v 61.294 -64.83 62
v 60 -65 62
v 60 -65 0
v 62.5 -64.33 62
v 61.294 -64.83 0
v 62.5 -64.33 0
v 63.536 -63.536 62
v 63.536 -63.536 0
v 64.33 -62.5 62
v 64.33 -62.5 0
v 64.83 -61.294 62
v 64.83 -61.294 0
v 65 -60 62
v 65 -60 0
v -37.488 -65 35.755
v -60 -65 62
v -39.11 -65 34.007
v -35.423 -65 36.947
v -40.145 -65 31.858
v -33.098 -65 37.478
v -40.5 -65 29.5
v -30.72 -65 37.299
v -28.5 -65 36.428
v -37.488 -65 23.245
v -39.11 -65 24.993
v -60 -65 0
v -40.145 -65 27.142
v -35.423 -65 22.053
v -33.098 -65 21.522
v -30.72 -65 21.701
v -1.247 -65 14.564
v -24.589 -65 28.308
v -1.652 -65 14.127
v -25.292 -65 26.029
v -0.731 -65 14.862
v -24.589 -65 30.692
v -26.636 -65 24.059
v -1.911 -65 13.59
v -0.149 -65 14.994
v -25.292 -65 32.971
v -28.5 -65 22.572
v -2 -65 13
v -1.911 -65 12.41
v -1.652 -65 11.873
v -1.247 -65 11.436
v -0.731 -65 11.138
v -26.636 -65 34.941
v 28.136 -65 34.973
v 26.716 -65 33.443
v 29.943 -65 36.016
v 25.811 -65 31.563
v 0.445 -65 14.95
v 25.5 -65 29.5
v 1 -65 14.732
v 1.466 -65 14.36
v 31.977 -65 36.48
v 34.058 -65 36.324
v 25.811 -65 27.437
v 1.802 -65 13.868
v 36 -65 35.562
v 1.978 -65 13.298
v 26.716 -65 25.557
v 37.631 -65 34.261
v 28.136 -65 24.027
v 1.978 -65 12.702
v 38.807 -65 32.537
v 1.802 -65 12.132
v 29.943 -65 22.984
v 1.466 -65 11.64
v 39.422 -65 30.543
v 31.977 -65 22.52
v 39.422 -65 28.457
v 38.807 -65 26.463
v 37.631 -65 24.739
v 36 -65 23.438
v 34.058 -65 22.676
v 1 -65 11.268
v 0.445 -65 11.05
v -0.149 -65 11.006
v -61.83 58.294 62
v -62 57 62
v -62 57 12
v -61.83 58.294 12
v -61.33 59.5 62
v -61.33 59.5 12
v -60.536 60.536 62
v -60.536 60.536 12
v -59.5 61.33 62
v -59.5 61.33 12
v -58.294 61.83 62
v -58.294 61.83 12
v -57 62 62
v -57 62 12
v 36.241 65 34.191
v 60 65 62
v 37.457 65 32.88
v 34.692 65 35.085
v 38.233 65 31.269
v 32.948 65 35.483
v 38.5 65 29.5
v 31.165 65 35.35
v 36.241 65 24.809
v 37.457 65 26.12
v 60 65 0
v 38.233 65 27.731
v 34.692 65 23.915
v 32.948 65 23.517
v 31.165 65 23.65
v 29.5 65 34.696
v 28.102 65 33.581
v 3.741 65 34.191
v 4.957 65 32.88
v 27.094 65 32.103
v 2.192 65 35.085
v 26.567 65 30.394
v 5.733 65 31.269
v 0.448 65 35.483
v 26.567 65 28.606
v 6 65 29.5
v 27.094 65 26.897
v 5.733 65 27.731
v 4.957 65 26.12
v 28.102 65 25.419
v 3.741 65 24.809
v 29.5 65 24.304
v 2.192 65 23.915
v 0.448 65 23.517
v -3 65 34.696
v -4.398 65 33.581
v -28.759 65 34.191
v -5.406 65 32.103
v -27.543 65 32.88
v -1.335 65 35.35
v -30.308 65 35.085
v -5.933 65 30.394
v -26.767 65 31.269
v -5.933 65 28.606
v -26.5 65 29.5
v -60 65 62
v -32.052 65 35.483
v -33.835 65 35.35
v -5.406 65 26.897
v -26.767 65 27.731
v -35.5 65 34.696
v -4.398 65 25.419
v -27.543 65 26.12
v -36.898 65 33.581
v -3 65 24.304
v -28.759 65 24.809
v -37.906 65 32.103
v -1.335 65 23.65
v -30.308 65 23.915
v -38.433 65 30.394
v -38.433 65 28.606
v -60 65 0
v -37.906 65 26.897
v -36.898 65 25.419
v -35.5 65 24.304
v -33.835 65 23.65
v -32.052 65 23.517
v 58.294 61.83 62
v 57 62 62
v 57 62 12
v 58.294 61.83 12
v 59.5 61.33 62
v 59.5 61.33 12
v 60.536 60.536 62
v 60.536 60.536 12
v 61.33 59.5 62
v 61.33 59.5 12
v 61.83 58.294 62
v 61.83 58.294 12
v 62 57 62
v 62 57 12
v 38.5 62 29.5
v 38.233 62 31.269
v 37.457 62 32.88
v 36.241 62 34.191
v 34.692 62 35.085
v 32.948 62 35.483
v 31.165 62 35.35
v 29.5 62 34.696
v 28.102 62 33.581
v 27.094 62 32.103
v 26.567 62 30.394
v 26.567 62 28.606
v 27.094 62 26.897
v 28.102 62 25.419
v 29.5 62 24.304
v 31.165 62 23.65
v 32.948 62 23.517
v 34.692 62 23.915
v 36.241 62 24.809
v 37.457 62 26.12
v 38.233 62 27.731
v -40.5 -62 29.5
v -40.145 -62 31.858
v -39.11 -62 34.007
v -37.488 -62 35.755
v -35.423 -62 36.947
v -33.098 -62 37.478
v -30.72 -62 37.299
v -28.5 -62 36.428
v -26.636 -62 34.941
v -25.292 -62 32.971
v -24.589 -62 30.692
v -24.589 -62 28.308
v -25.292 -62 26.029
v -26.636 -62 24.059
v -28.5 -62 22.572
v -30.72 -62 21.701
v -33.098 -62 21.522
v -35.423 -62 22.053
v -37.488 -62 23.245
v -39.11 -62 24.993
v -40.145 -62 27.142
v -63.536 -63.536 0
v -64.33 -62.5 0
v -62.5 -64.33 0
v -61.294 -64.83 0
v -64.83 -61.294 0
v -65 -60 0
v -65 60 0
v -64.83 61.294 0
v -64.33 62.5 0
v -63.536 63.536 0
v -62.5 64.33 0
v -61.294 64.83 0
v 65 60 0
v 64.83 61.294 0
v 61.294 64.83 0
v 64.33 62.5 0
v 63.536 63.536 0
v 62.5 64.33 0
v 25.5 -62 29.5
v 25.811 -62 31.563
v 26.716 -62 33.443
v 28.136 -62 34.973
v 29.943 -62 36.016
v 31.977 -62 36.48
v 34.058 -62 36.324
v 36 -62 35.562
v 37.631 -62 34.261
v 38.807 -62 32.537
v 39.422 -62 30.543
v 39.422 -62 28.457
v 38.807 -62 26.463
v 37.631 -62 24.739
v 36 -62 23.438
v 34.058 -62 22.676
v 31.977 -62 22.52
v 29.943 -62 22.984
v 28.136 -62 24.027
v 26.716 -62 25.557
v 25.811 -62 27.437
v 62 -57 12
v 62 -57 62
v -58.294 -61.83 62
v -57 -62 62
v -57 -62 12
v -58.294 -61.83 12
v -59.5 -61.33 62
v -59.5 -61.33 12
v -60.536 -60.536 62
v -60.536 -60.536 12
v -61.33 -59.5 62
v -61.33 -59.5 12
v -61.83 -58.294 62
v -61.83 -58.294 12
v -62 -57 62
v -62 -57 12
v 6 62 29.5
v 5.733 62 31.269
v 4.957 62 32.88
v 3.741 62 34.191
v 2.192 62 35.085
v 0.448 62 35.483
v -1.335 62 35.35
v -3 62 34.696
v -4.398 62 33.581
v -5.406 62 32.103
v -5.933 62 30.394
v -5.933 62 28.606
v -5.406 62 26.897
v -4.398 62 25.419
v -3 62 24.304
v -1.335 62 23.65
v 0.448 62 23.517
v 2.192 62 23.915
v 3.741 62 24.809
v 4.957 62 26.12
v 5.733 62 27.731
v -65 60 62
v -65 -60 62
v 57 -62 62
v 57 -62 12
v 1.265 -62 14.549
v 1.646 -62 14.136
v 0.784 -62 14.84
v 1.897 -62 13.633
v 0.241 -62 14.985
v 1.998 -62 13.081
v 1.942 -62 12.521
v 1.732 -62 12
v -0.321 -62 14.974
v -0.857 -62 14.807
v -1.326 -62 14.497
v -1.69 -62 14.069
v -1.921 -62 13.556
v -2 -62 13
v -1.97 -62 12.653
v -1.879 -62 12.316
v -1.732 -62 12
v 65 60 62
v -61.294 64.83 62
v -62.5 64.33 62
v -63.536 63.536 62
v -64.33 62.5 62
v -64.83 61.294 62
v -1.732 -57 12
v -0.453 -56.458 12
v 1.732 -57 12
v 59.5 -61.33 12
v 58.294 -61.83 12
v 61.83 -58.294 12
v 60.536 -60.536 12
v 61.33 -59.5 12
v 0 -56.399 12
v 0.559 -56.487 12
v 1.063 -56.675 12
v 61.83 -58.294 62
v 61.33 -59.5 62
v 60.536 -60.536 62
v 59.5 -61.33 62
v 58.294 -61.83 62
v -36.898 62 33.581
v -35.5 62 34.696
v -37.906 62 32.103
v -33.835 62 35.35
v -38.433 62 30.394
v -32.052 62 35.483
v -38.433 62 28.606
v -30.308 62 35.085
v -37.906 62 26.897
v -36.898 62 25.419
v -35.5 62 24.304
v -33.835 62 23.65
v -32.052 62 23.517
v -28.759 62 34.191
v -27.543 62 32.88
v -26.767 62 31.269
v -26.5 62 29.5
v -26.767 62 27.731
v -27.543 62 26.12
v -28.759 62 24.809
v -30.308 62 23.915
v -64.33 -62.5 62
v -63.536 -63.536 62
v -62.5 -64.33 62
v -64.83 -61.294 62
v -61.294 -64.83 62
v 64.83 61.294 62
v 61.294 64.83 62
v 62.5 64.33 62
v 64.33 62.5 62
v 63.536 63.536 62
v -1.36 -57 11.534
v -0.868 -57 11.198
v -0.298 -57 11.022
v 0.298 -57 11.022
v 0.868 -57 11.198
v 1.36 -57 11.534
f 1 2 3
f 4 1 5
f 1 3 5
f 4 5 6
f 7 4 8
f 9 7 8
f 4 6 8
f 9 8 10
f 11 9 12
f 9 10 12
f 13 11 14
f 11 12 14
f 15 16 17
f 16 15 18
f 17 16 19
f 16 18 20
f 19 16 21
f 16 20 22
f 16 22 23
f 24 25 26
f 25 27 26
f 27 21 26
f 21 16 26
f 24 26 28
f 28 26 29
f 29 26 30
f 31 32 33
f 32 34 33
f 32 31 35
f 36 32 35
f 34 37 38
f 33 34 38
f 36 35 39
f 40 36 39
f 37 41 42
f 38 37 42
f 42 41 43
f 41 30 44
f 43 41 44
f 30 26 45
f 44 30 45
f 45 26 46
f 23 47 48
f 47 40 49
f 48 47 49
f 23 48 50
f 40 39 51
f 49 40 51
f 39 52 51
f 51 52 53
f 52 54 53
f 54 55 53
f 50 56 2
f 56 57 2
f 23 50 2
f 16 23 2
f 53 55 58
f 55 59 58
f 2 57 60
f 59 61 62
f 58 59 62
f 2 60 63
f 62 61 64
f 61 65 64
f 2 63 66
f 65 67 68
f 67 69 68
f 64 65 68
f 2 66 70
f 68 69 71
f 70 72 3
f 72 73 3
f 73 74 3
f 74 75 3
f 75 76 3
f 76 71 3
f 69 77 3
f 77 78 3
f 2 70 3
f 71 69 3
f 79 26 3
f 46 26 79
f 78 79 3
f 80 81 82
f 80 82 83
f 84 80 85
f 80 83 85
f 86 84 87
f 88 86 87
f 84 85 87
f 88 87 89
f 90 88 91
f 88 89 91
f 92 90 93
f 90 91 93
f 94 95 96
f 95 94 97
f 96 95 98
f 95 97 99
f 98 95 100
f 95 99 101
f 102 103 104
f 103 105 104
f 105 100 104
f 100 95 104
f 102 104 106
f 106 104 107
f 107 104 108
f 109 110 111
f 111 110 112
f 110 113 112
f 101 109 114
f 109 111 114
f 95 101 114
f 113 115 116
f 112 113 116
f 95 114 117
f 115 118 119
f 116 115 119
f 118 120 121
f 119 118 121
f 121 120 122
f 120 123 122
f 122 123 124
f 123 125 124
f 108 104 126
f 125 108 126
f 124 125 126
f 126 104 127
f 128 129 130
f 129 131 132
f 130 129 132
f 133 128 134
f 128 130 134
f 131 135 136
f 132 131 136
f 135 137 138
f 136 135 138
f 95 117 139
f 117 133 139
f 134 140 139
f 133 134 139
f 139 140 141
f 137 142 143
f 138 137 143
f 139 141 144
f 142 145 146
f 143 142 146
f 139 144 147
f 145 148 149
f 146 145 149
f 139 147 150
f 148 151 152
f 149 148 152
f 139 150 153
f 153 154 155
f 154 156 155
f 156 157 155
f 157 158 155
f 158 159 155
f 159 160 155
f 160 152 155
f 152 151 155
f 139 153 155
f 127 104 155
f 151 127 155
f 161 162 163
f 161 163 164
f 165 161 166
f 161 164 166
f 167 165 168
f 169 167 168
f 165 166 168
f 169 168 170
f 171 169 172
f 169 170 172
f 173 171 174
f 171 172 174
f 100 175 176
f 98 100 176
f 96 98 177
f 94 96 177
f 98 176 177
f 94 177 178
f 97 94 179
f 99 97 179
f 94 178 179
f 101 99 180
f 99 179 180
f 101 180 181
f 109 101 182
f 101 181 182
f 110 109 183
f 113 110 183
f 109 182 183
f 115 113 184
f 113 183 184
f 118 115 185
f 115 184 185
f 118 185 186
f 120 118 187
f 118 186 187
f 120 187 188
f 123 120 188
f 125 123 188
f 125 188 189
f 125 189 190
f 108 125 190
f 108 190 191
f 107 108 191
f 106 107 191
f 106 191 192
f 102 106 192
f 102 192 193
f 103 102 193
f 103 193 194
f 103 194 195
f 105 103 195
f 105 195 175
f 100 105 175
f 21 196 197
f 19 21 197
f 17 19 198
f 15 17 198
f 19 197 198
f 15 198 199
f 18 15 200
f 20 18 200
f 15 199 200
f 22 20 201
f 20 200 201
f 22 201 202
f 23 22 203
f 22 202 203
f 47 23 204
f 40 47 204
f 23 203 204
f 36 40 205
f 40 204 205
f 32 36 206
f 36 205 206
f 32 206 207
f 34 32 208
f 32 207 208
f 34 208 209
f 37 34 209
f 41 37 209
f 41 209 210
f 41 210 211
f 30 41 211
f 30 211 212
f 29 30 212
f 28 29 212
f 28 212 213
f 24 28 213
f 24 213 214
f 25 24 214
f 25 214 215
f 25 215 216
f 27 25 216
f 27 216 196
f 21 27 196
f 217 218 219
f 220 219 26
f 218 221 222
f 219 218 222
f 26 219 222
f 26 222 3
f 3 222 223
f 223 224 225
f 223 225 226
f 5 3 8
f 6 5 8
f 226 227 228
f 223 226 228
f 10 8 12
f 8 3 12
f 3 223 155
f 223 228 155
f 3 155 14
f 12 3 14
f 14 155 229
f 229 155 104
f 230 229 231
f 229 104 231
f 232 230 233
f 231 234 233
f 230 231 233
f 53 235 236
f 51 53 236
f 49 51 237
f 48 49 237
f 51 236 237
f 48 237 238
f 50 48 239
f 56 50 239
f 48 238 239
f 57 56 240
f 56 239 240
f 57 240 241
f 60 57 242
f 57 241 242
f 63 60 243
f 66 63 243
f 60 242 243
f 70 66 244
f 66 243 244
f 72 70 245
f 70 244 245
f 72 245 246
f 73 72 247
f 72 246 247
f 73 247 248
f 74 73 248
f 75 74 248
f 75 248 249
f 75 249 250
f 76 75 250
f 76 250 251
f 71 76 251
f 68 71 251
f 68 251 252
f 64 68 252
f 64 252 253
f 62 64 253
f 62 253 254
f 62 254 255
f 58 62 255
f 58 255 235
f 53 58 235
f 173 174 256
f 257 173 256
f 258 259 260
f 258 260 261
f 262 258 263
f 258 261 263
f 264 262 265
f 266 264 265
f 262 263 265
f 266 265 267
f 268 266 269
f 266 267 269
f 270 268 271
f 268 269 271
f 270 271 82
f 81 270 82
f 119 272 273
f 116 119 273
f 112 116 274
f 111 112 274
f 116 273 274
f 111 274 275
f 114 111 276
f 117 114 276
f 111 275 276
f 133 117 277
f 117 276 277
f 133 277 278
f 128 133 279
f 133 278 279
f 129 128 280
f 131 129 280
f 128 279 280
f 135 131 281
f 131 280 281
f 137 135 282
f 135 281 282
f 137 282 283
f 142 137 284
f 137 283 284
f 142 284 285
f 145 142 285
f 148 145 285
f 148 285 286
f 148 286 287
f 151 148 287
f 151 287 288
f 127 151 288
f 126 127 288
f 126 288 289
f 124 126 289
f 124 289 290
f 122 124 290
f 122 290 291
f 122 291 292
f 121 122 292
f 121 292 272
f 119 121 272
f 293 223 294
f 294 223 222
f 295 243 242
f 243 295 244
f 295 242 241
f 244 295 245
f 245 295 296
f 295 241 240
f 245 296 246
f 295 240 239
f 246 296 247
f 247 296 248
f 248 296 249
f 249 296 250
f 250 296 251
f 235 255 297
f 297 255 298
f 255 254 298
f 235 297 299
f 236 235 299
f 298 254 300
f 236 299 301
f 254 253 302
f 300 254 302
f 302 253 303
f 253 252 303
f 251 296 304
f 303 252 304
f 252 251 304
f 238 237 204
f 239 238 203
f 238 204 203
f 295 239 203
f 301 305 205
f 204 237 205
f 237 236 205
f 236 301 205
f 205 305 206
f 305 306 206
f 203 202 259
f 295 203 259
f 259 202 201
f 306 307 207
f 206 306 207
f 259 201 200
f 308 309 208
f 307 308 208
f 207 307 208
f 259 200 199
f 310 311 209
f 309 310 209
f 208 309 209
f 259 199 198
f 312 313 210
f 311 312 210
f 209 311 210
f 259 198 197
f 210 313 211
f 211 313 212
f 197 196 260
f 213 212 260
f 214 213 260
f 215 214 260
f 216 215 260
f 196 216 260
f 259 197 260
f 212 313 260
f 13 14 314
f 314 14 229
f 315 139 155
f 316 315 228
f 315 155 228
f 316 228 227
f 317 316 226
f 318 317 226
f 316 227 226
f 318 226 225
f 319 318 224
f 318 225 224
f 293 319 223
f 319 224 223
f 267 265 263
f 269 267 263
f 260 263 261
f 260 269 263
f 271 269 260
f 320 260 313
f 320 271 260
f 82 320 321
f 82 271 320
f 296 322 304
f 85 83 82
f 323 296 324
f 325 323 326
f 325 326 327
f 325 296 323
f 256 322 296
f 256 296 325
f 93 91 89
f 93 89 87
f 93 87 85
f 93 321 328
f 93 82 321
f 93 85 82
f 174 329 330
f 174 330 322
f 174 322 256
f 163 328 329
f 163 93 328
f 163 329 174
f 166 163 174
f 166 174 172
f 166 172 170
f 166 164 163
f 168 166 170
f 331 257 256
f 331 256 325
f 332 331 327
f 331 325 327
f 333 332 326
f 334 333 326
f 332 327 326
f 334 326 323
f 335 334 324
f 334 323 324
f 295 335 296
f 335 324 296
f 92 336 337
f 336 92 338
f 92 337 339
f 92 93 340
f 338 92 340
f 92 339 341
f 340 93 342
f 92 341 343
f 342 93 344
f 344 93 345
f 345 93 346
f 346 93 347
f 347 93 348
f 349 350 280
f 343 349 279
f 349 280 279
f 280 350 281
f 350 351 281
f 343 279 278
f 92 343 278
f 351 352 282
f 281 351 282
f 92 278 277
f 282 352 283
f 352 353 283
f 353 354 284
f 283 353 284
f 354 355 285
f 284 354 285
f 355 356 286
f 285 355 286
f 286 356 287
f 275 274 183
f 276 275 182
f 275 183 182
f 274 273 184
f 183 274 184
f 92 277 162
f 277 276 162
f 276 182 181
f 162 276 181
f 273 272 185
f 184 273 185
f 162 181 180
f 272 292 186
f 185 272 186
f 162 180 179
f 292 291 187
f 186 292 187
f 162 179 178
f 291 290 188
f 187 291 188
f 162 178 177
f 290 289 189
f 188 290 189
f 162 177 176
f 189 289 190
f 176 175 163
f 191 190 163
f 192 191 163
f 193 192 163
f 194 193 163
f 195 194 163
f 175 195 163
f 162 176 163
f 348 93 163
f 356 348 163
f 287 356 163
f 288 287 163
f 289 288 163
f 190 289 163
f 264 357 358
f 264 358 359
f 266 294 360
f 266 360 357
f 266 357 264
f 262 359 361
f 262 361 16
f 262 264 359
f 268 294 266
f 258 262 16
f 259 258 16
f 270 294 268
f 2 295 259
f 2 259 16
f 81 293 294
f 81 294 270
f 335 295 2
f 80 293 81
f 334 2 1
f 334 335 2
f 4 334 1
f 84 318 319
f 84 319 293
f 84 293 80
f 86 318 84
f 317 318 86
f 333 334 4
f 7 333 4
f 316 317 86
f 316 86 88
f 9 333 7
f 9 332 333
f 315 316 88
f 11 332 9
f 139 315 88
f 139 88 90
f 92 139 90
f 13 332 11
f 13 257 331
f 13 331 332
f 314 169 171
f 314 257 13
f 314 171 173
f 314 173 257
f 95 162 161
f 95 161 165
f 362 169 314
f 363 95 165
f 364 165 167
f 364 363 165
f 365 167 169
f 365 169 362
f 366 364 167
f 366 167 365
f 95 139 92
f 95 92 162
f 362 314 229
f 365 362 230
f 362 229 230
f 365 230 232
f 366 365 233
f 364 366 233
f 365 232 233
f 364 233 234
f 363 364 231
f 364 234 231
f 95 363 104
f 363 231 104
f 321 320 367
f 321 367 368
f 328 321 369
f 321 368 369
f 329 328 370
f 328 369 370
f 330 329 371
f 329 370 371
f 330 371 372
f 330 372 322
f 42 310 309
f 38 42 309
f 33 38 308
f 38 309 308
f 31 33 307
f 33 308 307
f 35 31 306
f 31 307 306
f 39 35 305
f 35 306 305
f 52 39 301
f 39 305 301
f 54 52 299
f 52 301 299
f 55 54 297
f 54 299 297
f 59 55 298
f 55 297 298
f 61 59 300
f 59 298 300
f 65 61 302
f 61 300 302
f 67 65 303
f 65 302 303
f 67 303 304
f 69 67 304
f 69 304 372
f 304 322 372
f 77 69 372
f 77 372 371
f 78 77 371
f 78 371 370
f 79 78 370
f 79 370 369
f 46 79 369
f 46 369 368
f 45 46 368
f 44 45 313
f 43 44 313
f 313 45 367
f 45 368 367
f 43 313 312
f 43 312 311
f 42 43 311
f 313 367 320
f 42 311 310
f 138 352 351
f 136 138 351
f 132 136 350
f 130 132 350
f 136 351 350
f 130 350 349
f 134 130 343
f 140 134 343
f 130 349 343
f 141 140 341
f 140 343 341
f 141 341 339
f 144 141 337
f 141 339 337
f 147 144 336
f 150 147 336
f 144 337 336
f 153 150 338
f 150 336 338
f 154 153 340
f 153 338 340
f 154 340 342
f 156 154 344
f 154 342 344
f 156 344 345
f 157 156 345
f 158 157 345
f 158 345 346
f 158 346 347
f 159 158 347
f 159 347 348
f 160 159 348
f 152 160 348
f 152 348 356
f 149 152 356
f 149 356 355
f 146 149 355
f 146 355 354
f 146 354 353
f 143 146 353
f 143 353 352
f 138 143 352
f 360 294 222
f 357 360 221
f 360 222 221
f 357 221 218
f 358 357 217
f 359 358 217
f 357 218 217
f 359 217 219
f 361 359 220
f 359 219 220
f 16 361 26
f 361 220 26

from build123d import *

# Parameters (mm, degrees)
F1_DEPTH = 62
F2_DEPTH = 12
F4_D     = 12
F4_DEPTH = 8
F4_TIP   = 3.6051637142
F6_D     = 16
F6_DEPTH = 8
F6_TIP   = 4.8068849522
F7_D     = 4
F7_DEPTH = 8
F7_TIP   = 1.2017212381
F8_D     = 14
F8_DEPTH = 8
F8_TIP   = 4.2060243332


with BuildPart() as f1:
    # F0 (on Top) → F1 (new body)
    with BuildSketch(Plane.XY):
        with BuildLine():
            ThreePointArc((65, 60), (63.5355339059, 63.5355339059), (60, 65))
            Line((60, 65), (-60, 65))
            ThreePointArc((-60, 65), (-63.5355339059, 63.5355339059), (-65, 60))
            Line((-65, 60), (-65, -60))
            ThreePointArc((-65, -60), (-63.5355339059, -63.5355339059), (-60, -65))
            Line((-60, -65), (60, -65))
            ThreePointArc((60, -65), (63.5355339059, -63.5355339059), (65, -60))
            Line((65, -60), (65, 60))
        make_face()
        with BuildLine():
            Line((-57, 62), (57, 62))
            ThreePointArc((57, 62), (60.5355339059, 60.5355339059), (62, 57))
            Line((62, 57), (62, -57))
            ThreePointArc((62, -57), (60.5355339059, -60.5355339059), (57, -62))
            Line((57, -62), (-57, -62))
            ThreePointArc((-57, -62), (-60.5355339059, -60.5355339059), (-62, -57))
            Line((-62, -57), (-62, 57))
            ThreePointArc((-62, 57), (-60.5355339059, 60.5355339059), (-57, 62))
        make_face(mode=Mode.SUBTRACT)
    extrude(amount=F1_DEPTH)

    # F0 (on Top) → F2 (join)
    with BuildSketch(Plane.XY):
        with BuildLine():
            ThreePointArc((62, 57), (60.5355339059, 60.5355339059), (57, 62))
            Line((57, 62), (-57, 62))
            ThreePointArc((-57, 62), (-60.5355339059, 60.5355339059), (-62, 57))
            Line((-62, 57), (-62, -57))
            ThreePointArc((-62, -57), (-60.5355339059, -60.5355339059), (-57, -62))
            Line((-57, -62), (57, -62))
            ThreePointArc((57, -62), (60.5355339059, -60.5355339059), (62, -57))
            Line((62, -57), (62, 57))
        make_face()
    extrude(amount=F2_DEPTH)

    # F4
    with Locations(Plane(origin=(0, 65, 0), x_dir=(-1, 0, 0), z_dir=(0, 1, 0))):
        with Locations((-32.5, 29.5), (0, 29.5), (32.5, 29.5)):
            Hole(F4_D / 2, depth=F4_DEPTH)
            with Locations((0, 0, -(F4_DEPTH + F4_TIP / 2))):  # 118° drill point
                Cone(0, F4_D / 2, F4_TIP, mode=Mode.SUBTRACT)

    # F6
    with Locations(Plane.XZ.offset(65)):
        with Locations((-32.5, 29.5)):
            Hole(F6_D / 2, depth=F6_DEPTH)
            with Locations((0, 0, -(F6_DEPTH + F6_TIP / 2))):  # 118° drill point
                Cone(0, F6_D / 2, F6_TIP, mode=Mode.SUBTRACT)

    # F7
    with Locations(Plane.XZ.offset(65)):
        with Locations((0, 13)):
            Hole(F7_D / 2, depth=F7_DEPTH)
            with Locations((0, 0, -(F7_DEPTH + F7_TIP / 2))):  # 118° drill point
                Cone(0, F7_D / 2, F7_TIP, mode=Mode.SUBTRACT)

    # F8
    with Locations(Plane.XZ.offset(65)):
        with Locations((32.5, 29.5)):
            Hole(F8_D / 2, depth=F8_DEPTH)
            with Locations((0, 0, -(F8_DEPTH + F8_TIP / 2))):  # 118° drill point
                Cone(0, F8_D / 2, F8_TIP, mode=Mode.SUBTRACT)


solid = f1.part
